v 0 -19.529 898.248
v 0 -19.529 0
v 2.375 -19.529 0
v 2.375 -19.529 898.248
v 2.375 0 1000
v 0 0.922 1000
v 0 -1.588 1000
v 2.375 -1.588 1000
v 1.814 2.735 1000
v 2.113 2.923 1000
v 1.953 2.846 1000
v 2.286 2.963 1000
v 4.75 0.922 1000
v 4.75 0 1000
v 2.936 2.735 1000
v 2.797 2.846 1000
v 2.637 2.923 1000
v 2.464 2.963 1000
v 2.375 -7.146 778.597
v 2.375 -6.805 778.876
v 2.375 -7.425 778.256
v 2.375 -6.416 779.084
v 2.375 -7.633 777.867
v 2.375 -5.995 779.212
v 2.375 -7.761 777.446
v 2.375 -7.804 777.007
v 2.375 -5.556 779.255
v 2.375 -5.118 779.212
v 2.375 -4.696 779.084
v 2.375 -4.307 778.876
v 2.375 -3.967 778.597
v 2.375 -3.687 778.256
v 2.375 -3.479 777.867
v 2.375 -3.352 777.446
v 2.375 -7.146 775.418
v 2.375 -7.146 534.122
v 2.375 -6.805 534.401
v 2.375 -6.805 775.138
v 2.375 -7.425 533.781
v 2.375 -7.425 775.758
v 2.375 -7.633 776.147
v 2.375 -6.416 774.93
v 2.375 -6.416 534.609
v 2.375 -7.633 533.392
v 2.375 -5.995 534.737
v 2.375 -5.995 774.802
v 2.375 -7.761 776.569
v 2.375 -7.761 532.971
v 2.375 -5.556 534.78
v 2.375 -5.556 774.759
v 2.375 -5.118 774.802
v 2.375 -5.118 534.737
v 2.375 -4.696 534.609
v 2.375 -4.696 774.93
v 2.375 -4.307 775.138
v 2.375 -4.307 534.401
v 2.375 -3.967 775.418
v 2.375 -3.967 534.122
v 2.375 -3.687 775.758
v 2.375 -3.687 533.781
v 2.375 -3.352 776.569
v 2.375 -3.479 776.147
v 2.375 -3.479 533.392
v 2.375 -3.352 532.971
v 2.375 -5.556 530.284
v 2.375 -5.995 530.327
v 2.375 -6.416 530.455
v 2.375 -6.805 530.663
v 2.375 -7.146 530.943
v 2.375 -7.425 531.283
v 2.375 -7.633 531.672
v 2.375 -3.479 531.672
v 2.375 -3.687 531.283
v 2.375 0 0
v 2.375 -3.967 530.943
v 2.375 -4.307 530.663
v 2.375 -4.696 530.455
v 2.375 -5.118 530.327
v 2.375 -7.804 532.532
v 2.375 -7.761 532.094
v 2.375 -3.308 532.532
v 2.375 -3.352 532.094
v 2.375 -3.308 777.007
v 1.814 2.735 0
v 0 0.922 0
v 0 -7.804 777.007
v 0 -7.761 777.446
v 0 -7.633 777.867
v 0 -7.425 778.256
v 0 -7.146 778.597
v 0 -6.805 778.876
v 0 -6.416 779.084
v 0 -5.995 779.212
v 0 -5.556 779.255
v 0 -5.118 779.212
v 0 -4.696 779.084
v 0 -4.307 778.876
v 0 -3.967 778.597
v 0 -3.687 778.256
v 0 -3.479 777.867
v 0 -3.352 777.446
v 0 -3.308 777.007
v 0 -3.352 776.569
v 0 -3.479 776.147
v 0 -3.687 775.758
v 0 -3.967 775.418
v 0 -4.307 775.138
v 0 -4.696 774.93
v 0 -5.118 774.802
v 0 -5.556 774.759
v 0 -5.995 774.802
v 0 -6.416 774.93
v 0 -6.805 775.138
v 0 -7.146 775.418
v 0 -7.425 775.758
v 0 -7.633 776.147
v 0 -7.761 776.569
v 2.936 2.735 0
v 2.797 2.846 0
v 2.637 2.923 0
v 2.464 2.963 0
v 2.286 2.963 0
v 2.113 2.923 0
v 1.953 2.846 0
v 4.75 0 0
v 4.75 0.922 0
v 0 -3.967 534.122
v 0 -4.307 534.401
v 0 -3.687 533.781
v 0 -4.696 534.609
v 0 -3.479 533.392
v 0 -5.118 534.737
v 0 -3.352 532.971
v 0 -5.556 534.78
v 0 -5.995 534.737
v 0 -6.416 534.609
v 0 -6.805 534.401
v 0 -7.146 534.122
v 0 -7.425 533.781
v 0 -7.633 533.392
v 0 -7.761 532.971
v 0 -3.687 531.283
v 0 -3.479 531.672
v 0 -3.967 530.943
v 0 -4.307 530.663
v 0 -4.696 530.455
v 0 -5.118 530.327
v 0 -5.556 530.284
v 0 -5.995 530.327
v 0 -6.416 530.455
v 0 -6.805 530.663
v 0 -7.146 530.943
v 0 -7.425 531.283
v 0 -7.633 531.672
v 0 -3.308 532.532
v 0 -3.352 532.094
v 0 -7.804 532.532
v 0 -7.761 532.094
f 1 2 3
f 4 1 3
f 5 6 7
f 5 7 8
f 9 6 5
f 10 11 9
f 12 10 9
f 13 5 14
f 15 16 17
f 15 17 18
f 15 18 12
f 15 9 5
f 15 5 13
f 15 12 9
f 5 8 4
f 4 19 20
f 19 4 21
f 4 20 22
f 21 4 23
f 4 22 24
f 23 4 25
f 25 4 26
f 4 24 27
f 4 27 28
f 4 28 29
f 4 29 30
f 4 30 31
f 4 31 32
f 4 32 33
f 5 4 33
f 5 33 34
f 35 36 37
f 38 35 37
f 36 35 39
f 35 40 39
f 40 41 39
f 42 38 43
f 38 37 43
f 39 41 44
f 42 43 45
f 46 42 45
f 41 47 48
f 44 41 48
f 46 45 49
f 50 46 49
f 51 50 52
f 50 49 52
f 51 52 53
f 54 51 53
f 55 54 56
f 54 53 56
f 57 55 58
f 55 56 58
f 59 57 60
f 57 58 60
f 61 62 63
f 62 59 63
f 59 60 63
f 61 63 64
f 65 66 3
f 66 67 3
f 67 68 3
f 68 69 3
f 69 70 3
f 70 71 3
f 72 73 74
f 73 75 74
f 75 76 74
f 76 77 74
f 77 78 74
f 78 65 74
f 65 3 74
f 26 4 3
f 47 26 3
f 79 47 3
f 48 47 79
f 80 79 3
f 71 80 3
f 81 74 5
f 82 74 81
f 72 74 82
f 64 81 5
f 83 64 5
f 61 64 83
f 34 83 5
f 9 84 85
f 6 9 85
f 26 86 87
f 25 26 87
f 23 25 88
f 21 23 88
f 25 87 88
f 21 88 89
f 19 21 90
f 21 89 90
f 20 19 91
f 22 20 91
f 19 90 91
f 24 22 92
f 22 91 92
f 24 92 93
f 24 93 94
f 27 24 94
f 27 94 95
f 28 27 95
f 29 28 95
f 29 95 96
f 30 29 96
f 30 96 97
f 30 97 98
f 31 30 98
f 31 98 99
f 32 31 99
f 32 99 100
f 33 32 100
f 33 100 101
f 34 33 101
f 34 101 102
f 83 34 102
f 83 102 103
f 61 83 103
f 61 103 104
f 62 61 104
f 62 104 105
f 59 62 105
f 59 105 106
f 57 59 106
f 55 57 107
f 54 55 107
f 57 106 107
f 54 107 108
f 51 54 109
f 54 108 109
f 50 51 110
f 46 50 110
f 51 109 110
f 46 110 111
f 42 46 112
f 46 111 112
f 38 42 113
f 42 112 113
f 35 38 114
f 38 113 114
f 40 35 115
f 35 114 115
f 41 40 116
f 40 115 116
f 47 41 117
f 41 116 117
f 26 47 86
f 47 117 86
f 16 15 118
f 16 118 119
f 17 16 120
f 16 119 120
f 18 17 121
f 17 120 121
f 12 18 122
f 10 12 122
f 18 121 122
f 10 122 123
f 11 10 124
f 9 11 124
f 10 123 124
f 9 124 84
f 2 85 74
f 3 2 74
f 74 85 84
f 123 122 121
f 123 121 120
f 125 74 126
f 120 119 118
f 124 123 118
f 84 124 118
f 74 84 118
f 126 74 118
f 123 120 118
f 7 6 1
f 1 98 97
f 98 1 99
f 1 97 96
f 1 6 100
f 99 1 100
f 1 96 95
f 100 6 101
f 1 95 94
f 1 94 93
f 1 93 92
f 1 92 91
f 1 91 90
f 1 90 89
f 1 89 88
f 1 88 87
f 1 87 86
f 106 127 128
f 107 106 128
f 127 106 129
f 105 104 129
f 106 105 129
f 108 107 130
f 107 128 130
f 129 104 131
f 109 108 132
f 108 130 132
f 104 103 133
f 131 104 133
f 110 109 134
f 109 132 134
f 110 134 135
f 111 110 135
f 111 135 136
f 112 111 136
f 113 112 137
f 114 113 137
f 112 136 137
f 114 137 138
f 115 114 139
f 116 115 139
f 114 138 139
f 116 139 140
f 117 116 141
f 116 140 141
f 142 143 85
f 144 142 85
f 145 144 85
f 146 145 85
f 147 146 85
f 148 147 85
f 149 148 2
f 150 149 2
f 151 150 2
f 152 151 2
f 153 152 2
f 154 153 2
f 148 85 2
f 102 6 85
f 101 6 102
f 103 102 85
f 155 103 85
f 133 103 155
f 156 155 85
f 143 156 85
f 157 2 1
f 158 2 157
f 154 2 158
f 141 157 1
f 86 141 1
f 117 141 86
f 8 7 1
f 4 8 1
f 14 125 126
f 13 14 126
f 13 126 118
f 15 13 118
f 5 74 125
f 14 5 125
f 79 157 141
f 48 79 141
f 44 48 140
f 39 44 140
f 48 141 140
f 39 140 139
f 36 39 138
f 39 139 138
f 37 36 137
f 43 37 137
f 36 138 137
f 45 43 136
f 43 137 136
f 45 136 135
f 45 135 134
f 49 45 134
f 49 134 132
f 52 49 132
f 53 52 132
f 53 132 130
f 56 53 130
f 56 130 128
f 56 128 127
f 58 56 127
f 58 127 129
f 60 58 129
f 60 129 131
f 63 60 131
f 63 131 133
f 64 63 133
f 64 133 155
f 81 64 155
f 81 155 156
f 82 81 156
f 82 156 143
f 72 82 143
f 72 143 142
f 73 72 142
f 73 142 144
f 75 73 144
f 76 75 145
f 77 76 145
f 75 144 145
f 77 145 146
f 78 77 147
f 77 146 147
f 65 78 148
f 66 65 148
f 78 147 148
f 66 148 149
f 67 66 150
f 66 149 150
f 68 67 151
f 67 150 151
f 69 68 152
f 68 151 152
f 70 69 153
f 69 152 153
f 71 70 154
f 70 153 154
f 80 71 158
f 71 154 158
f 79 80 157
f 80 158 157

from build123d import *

# Parameters (mm, degrees)
F0_W     = 2.375
F0_H     = 19.5291
F1_DEPTH = 1000
F2_R     = 2.2479
F3_DEPTH = 4.75


with BuildPart() as f1:
    # F0 (on Top) → F1 (new body)
    with BuildSketch(Plane.XY):
        with BuildLine():
            Line((0, 0.921682), (0, 0))
            Line((0, 0), (2.375, 0))
            Line((2.375, 0), (4.75, 0))
            Line((4.75, 0), (4.75, 0.921682))
            Line((4.75, 0.921682), (2.936266, 2.735416))
            ThreePointArc((2.936266, 2.735416), (2.375, 2.9679), (1.813734, 2.735416))
            Line((1.813734, 2.735416), (0, 0.921682))
        make_face()
        with Locations((1.1875, -9.76455)):
            Rectangle(F0_W, F0_H)
    extrude(amount=F1_DEPTH)

    # F2 (on face) → F3 (cut, through all)
    with BuildSketch(Plane(origin=(0, 0, 0), x_dir=(0, -1, 0), z_dir=(-1, 0, 0))):
        Polygon((19.5291, 898.24813), (19.5291, 1000), (1.5875, 1000), align=None)
        with Locations((5.55625, 777.007047)):
            Circle(F2_R)
        with Locations((5.55625, 532.532047)):
            Circle(F2_R)
    extrude(amount=-F3_DEPTH, mode=Mode.SUBTRACT)


solid = f1.part
